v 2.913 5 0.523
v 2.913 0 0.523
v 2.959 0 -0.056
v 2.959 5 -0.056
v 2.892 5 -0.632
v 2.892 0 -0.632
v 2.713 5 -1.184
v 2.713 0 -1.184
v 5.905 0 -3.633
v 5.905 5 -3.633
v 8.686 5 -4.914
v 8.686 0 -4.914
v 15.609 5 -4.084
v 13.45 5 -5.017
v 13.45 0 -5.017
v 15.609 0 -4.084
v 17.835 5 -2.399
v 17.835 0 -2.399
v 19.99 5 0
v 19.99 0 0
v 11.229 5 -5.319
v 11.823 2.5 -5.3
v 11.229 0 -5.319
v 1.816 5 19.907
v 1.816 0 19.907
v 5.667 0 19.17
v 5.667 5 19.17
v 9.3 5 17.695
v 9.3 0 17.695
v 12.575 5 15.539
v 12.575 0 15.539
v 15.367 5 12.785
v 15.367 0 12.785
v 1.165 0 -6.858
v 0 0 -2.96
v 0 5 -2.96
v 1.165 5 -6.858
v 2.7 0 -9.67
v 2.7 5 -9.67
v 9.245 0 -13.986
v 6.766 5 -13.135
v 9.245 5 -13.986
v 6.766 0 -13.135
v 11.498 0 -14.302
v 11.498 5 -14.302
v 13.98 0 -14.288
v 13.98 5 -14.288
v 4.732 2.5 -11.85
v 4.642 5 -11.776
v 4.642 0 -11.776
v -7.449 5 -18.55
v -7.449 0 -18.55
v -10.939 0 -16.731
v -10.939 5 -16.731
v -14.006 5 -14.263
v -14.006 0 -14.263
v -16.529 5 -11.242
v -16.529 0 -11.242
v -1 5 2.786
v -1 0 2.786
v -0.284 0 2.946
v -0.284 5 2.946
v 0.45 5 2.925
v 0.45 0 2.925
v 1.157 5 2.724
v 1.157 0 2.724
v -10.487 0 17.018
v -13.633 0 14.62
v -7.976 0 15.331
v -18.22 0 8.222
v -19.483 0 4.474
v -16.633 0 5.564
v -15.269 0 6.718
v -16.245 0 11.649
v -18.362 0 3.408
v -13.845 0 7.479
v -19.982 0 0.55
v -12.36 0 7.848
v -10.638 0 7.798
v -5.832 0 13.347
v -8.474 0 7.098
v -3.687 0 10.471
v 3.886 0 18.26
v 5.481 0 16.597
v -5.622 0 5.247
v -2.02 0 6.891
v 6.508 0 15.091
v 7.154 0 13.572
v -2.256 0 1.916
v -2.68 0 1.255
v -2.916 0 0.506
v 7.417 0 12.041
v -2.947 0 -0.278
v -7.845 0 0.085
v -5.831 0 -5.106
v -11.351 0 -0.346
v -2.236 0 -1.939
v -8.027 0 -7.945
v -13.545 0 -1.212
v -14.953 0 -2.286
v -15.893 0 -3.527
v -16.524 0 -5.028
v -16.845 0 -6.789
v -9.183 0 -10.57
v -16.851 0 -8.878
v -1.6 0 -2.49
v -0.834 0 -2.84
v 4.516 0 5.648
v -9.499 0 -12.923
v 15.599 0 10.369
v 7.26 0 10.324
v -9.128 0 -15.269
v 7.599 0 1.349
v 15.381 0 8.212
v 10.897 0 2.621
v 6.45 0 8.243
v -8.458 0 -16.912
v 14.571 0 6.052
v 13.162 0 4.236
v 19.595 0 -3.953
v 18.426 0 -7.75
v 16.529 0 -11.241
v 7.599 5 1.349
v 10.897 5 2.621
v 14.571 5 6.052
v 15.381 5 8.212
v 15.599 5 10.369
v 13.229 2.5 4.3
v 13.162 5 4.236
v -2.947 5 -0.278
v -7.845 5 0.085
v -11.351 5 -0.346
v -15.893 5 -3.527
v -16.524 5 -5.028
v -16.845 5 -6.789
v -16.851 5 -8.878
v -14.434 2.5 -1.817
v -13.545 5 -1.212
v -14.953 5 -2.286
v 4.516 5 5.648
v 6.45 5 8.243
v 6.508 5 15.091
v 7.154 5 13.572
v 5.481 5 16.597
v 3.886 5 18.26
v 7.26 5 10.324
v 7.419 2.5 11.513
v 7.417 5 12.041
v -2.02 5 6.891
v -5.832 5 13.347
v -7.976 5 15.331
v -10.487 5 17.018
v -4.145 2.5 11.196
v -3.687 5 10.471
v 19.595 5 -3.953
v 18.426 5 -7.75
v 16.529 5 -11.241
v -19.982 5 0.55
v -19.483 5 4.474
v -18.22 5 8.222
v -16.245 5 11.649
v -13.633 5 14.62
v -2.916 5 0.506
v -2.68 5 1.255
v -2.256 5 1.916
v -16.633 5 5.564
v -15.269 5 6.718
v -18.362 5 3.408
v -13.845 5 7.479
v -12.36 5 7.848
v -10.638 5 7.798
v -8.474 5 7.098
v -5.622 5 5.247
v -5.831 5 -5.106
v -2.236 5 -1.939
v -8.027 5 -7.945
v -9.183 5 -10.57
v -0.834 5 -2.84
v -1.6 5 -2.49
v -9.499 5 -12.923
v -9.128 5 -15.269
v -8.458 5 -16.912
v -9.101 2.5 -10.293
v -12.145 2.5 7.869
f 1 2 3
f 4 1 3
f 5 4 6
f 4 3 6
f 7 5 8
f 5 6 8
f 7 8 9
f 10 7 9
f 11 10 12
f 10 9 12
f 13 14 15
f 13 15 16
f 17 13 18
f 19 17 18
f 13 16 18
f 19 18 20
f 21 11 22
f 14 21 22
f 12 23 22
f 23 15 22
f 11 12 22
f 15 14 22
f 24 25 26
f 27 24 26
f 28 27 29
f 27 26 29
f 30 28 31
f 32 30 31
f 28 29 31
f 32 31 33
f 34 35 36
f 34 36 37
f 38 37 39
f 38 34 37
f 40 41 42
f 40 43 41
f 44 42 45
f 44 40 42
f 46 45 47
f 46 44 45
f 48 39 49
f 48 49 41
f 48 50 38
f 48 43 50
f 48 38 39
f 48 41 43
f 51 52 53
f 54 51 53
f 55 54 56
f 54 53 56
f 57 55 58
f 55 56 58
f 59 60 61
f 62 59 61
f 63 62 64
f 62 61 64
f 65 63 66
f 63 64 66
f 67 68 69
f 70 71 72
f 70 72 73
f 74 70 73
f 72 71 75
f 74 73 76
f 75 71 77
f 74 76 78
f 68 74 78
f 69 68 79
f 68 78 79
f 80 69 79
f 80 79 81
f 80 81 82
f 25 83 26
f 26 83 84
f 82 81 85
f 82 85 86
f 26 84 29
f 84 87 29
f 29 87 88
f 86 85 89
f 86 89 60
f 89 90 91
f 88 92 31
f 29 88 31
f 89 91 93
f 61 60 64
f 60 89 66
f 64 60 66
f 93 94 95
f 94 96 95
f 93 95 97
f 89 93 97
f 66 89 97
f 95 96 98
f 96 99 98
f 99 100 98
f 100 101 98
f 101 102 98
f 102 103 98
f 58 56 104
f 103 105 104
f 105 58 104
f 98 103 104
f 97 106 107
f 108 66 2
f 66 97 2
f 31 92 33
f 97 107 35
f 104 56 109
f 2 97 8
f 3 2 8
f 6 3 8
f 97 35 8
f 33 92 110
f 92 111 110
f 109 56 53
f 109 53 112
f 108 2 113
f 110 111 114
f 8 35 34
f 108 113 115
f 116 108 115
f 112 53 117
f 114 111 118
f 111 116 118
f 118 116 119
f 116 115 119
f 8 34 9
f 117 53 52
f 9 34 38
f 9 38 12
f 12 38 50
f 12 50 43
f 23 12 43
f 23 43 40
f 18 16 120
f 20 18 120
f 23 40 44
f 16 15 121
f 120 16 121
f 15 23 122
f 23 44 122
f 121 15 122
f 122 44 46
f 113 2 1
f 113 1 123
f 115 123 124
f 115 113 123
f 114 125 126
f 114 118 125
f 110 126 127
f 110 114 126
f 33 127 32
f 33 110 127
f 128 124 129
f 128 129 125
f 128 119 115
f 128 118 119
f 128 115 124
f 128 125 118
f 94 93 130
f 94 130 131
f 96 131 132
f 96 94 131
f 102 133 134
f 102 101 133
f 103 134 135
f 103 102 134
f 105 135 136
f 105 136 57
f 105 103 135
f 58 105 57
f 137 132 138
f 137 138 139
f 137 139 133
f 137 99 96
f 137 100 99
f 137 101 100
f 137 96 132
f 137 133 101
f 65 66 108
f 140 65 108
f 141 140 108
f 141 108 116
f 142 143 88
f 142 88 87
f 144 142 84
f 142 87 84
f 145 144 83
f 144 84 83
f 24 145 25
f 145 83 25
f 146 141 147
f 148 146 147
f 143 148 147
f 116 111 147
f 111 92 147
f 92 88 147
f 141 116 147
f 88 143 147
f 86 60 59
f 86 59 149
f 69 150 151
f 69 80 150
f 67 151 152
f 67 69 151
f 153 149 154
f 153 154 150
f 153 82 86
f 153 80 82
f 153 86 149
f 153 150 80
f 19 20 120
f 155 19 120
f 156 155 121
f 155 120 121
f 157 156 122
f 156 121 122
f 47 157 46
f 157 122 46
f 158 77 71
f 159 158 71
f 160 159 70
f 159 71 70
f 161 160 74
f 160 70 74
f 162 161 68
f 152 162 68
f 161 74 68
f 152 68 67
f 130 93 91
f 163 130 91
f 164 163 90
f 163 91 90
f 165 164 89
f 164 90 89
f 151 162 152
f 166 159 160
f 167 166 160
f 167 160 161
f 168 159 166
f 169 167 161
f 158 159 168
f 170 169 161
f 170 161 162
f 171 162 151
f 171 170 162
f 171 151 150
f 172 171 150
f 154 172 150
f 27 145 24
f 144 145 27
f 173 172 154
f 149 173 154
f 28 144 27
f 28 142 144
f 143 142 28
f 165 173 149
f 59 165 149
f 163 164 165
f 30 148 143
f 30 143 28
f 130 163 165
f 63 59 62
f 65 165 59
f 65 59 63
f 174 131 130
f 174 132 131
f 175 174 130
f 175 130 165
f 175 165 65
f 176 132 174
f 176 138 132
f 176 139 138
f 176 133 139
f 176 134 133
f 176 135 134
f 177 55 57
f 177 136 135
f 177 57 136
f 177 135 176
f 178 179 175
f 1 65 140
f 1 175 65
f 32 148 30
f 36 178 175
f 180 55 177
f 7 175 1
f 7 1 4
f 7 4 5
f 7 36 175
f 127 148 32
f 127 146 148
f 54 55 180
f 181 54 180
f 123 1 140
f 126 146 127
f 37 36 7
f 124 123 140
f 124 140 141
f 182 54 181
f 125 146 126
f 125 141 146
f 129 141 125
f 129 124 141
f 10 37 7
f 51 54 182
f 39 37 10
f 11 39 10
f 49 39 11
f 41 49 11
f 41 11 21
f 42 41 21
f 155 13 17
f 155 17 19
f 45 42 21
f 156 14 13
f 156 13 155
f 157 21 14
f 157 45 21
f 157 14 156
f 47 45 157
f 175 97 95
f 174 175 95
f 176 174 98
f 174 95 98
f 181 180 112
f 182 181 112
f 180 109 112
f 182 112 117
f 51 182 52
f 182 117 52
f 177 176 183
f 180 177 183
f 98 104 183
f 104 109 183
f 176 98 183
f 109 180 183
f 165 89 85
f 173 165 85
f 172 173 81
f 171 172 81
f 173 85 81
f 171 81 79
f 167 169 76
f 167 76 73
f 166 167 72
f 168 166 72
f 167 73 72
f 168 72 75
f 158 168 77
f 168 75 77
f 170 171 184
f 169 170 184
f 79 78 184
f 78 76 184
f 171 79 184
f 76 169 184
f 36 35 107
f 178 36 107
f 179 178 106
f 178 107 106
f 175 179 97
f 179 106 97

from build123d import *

# Parameters (mm, degrees)
BOSS_EXTRUDE2_DEPTH = 5


with BuildPart() as part:
    # Sketch3 → Boss-Extrude2 (new body)
    with BuildSketch(Plane(origin=(0, 0, 0), x_dir=(1, 0, 0), z_dir=(0, 1, 0))):
        with BuildLine():
            ThreePointArc((-2.946687169, 0.278195868), (-2.823196953, -0.888772849), (-2.255920315, -1.916032813))
            add(Edge.make_bspline(
                [(-2.255920315, -1.916032813), (-13.171337356, -14.504845087), (-19.982146303, -0.549733438)],
                knots=[0, 0, 0, 1, 1, 1], degree=2))
            ThreePointArc((-19.982146303, -0.549733438), (-17.317507753, -9.984603294), (-10.487312447, -17.017774689))
            add(Edge.make_bspline(
                [(-1.000187104, -2.785674778), (-2.546841566, -12.490182628), (-10.487312447, -17.017774689)],
                knots=[0, 0, 0, 1, 1, 1], degree=2))
            ThreePointArc((-1.000187104, -2.785674778), (0.084052871, -2.958596513), (1.156726663, -2.724397481))
            add(Edge.make_bspline(
                [(1.156726663, -2.724397481), (13.351165317, -11.711219241), (1.815860807, -19.907059734)],
                knots=[0, 0, 0, 1, 1, 1], degree=2))
            ThreePointArc((1.815860807, -19.907059734), (9.30002387, -17.694573568), (15.366618382, -12.784968409))
            add(Edge.make_bspline(
                [(2.913240883, -0.522863047), (17.317700847, -1.946688078), (15.366618382, -12.784968409)],
                knots=[0, 0, 0, 1, 1, 1], degree=2))
            ThreePointArc((2.913240883, -0.522863047), (2.939564994, 0.345421275), (2.712677202, 1.183951269))
            add(Edge.make_bspline(
                [(2.712677202, 1.183951269), (12.295659798, 10.008861874), (19.989706794, 0)],
                knots=[0, 0, 0, 1, 1, 1], degree=2))
            ThreePointArc((19.989706794, 0), (18.426097238, 7.750310851), (13.979881947, 14.288151681))
            add(Edge.make_bspline(
                [(0, 2.959790231), (2.474515592, 15.075911373), (13.979881947, 14.288151681)],
                knots=[0, 0, 0, 1, 1, 1], degree=2))
            ThreePointArc((0, 2.959790231), (-1.229068634, 2.692535702), (-2.236179538, 1.939035658))
            add(Edge.make_bspline(
                [(-2.236179538, 1.939035658), (-13.359480088, 10.340651394), (-7.448796697, 18.550035189)],
                knots=[0, 0, 0, 1, 1, 1], degree=2))
            ThreePointArc((-7.448796697, 18.550035189), (-12.533274778, 15.572584919), (-16.528834056, 11.242153818))
            add(Edge.make_bspline(
                [(-2.946687169, 0.278195868), (-19.130769908, -2.126973155), (-16.528834056, 11.242153818)],
                knots=[0, 0, 0, 1, 1, 1], degree=2))
        make_face()
    extrude(amount=BOSS_EXTRUDE2_DEPTH)


solid = part.part
